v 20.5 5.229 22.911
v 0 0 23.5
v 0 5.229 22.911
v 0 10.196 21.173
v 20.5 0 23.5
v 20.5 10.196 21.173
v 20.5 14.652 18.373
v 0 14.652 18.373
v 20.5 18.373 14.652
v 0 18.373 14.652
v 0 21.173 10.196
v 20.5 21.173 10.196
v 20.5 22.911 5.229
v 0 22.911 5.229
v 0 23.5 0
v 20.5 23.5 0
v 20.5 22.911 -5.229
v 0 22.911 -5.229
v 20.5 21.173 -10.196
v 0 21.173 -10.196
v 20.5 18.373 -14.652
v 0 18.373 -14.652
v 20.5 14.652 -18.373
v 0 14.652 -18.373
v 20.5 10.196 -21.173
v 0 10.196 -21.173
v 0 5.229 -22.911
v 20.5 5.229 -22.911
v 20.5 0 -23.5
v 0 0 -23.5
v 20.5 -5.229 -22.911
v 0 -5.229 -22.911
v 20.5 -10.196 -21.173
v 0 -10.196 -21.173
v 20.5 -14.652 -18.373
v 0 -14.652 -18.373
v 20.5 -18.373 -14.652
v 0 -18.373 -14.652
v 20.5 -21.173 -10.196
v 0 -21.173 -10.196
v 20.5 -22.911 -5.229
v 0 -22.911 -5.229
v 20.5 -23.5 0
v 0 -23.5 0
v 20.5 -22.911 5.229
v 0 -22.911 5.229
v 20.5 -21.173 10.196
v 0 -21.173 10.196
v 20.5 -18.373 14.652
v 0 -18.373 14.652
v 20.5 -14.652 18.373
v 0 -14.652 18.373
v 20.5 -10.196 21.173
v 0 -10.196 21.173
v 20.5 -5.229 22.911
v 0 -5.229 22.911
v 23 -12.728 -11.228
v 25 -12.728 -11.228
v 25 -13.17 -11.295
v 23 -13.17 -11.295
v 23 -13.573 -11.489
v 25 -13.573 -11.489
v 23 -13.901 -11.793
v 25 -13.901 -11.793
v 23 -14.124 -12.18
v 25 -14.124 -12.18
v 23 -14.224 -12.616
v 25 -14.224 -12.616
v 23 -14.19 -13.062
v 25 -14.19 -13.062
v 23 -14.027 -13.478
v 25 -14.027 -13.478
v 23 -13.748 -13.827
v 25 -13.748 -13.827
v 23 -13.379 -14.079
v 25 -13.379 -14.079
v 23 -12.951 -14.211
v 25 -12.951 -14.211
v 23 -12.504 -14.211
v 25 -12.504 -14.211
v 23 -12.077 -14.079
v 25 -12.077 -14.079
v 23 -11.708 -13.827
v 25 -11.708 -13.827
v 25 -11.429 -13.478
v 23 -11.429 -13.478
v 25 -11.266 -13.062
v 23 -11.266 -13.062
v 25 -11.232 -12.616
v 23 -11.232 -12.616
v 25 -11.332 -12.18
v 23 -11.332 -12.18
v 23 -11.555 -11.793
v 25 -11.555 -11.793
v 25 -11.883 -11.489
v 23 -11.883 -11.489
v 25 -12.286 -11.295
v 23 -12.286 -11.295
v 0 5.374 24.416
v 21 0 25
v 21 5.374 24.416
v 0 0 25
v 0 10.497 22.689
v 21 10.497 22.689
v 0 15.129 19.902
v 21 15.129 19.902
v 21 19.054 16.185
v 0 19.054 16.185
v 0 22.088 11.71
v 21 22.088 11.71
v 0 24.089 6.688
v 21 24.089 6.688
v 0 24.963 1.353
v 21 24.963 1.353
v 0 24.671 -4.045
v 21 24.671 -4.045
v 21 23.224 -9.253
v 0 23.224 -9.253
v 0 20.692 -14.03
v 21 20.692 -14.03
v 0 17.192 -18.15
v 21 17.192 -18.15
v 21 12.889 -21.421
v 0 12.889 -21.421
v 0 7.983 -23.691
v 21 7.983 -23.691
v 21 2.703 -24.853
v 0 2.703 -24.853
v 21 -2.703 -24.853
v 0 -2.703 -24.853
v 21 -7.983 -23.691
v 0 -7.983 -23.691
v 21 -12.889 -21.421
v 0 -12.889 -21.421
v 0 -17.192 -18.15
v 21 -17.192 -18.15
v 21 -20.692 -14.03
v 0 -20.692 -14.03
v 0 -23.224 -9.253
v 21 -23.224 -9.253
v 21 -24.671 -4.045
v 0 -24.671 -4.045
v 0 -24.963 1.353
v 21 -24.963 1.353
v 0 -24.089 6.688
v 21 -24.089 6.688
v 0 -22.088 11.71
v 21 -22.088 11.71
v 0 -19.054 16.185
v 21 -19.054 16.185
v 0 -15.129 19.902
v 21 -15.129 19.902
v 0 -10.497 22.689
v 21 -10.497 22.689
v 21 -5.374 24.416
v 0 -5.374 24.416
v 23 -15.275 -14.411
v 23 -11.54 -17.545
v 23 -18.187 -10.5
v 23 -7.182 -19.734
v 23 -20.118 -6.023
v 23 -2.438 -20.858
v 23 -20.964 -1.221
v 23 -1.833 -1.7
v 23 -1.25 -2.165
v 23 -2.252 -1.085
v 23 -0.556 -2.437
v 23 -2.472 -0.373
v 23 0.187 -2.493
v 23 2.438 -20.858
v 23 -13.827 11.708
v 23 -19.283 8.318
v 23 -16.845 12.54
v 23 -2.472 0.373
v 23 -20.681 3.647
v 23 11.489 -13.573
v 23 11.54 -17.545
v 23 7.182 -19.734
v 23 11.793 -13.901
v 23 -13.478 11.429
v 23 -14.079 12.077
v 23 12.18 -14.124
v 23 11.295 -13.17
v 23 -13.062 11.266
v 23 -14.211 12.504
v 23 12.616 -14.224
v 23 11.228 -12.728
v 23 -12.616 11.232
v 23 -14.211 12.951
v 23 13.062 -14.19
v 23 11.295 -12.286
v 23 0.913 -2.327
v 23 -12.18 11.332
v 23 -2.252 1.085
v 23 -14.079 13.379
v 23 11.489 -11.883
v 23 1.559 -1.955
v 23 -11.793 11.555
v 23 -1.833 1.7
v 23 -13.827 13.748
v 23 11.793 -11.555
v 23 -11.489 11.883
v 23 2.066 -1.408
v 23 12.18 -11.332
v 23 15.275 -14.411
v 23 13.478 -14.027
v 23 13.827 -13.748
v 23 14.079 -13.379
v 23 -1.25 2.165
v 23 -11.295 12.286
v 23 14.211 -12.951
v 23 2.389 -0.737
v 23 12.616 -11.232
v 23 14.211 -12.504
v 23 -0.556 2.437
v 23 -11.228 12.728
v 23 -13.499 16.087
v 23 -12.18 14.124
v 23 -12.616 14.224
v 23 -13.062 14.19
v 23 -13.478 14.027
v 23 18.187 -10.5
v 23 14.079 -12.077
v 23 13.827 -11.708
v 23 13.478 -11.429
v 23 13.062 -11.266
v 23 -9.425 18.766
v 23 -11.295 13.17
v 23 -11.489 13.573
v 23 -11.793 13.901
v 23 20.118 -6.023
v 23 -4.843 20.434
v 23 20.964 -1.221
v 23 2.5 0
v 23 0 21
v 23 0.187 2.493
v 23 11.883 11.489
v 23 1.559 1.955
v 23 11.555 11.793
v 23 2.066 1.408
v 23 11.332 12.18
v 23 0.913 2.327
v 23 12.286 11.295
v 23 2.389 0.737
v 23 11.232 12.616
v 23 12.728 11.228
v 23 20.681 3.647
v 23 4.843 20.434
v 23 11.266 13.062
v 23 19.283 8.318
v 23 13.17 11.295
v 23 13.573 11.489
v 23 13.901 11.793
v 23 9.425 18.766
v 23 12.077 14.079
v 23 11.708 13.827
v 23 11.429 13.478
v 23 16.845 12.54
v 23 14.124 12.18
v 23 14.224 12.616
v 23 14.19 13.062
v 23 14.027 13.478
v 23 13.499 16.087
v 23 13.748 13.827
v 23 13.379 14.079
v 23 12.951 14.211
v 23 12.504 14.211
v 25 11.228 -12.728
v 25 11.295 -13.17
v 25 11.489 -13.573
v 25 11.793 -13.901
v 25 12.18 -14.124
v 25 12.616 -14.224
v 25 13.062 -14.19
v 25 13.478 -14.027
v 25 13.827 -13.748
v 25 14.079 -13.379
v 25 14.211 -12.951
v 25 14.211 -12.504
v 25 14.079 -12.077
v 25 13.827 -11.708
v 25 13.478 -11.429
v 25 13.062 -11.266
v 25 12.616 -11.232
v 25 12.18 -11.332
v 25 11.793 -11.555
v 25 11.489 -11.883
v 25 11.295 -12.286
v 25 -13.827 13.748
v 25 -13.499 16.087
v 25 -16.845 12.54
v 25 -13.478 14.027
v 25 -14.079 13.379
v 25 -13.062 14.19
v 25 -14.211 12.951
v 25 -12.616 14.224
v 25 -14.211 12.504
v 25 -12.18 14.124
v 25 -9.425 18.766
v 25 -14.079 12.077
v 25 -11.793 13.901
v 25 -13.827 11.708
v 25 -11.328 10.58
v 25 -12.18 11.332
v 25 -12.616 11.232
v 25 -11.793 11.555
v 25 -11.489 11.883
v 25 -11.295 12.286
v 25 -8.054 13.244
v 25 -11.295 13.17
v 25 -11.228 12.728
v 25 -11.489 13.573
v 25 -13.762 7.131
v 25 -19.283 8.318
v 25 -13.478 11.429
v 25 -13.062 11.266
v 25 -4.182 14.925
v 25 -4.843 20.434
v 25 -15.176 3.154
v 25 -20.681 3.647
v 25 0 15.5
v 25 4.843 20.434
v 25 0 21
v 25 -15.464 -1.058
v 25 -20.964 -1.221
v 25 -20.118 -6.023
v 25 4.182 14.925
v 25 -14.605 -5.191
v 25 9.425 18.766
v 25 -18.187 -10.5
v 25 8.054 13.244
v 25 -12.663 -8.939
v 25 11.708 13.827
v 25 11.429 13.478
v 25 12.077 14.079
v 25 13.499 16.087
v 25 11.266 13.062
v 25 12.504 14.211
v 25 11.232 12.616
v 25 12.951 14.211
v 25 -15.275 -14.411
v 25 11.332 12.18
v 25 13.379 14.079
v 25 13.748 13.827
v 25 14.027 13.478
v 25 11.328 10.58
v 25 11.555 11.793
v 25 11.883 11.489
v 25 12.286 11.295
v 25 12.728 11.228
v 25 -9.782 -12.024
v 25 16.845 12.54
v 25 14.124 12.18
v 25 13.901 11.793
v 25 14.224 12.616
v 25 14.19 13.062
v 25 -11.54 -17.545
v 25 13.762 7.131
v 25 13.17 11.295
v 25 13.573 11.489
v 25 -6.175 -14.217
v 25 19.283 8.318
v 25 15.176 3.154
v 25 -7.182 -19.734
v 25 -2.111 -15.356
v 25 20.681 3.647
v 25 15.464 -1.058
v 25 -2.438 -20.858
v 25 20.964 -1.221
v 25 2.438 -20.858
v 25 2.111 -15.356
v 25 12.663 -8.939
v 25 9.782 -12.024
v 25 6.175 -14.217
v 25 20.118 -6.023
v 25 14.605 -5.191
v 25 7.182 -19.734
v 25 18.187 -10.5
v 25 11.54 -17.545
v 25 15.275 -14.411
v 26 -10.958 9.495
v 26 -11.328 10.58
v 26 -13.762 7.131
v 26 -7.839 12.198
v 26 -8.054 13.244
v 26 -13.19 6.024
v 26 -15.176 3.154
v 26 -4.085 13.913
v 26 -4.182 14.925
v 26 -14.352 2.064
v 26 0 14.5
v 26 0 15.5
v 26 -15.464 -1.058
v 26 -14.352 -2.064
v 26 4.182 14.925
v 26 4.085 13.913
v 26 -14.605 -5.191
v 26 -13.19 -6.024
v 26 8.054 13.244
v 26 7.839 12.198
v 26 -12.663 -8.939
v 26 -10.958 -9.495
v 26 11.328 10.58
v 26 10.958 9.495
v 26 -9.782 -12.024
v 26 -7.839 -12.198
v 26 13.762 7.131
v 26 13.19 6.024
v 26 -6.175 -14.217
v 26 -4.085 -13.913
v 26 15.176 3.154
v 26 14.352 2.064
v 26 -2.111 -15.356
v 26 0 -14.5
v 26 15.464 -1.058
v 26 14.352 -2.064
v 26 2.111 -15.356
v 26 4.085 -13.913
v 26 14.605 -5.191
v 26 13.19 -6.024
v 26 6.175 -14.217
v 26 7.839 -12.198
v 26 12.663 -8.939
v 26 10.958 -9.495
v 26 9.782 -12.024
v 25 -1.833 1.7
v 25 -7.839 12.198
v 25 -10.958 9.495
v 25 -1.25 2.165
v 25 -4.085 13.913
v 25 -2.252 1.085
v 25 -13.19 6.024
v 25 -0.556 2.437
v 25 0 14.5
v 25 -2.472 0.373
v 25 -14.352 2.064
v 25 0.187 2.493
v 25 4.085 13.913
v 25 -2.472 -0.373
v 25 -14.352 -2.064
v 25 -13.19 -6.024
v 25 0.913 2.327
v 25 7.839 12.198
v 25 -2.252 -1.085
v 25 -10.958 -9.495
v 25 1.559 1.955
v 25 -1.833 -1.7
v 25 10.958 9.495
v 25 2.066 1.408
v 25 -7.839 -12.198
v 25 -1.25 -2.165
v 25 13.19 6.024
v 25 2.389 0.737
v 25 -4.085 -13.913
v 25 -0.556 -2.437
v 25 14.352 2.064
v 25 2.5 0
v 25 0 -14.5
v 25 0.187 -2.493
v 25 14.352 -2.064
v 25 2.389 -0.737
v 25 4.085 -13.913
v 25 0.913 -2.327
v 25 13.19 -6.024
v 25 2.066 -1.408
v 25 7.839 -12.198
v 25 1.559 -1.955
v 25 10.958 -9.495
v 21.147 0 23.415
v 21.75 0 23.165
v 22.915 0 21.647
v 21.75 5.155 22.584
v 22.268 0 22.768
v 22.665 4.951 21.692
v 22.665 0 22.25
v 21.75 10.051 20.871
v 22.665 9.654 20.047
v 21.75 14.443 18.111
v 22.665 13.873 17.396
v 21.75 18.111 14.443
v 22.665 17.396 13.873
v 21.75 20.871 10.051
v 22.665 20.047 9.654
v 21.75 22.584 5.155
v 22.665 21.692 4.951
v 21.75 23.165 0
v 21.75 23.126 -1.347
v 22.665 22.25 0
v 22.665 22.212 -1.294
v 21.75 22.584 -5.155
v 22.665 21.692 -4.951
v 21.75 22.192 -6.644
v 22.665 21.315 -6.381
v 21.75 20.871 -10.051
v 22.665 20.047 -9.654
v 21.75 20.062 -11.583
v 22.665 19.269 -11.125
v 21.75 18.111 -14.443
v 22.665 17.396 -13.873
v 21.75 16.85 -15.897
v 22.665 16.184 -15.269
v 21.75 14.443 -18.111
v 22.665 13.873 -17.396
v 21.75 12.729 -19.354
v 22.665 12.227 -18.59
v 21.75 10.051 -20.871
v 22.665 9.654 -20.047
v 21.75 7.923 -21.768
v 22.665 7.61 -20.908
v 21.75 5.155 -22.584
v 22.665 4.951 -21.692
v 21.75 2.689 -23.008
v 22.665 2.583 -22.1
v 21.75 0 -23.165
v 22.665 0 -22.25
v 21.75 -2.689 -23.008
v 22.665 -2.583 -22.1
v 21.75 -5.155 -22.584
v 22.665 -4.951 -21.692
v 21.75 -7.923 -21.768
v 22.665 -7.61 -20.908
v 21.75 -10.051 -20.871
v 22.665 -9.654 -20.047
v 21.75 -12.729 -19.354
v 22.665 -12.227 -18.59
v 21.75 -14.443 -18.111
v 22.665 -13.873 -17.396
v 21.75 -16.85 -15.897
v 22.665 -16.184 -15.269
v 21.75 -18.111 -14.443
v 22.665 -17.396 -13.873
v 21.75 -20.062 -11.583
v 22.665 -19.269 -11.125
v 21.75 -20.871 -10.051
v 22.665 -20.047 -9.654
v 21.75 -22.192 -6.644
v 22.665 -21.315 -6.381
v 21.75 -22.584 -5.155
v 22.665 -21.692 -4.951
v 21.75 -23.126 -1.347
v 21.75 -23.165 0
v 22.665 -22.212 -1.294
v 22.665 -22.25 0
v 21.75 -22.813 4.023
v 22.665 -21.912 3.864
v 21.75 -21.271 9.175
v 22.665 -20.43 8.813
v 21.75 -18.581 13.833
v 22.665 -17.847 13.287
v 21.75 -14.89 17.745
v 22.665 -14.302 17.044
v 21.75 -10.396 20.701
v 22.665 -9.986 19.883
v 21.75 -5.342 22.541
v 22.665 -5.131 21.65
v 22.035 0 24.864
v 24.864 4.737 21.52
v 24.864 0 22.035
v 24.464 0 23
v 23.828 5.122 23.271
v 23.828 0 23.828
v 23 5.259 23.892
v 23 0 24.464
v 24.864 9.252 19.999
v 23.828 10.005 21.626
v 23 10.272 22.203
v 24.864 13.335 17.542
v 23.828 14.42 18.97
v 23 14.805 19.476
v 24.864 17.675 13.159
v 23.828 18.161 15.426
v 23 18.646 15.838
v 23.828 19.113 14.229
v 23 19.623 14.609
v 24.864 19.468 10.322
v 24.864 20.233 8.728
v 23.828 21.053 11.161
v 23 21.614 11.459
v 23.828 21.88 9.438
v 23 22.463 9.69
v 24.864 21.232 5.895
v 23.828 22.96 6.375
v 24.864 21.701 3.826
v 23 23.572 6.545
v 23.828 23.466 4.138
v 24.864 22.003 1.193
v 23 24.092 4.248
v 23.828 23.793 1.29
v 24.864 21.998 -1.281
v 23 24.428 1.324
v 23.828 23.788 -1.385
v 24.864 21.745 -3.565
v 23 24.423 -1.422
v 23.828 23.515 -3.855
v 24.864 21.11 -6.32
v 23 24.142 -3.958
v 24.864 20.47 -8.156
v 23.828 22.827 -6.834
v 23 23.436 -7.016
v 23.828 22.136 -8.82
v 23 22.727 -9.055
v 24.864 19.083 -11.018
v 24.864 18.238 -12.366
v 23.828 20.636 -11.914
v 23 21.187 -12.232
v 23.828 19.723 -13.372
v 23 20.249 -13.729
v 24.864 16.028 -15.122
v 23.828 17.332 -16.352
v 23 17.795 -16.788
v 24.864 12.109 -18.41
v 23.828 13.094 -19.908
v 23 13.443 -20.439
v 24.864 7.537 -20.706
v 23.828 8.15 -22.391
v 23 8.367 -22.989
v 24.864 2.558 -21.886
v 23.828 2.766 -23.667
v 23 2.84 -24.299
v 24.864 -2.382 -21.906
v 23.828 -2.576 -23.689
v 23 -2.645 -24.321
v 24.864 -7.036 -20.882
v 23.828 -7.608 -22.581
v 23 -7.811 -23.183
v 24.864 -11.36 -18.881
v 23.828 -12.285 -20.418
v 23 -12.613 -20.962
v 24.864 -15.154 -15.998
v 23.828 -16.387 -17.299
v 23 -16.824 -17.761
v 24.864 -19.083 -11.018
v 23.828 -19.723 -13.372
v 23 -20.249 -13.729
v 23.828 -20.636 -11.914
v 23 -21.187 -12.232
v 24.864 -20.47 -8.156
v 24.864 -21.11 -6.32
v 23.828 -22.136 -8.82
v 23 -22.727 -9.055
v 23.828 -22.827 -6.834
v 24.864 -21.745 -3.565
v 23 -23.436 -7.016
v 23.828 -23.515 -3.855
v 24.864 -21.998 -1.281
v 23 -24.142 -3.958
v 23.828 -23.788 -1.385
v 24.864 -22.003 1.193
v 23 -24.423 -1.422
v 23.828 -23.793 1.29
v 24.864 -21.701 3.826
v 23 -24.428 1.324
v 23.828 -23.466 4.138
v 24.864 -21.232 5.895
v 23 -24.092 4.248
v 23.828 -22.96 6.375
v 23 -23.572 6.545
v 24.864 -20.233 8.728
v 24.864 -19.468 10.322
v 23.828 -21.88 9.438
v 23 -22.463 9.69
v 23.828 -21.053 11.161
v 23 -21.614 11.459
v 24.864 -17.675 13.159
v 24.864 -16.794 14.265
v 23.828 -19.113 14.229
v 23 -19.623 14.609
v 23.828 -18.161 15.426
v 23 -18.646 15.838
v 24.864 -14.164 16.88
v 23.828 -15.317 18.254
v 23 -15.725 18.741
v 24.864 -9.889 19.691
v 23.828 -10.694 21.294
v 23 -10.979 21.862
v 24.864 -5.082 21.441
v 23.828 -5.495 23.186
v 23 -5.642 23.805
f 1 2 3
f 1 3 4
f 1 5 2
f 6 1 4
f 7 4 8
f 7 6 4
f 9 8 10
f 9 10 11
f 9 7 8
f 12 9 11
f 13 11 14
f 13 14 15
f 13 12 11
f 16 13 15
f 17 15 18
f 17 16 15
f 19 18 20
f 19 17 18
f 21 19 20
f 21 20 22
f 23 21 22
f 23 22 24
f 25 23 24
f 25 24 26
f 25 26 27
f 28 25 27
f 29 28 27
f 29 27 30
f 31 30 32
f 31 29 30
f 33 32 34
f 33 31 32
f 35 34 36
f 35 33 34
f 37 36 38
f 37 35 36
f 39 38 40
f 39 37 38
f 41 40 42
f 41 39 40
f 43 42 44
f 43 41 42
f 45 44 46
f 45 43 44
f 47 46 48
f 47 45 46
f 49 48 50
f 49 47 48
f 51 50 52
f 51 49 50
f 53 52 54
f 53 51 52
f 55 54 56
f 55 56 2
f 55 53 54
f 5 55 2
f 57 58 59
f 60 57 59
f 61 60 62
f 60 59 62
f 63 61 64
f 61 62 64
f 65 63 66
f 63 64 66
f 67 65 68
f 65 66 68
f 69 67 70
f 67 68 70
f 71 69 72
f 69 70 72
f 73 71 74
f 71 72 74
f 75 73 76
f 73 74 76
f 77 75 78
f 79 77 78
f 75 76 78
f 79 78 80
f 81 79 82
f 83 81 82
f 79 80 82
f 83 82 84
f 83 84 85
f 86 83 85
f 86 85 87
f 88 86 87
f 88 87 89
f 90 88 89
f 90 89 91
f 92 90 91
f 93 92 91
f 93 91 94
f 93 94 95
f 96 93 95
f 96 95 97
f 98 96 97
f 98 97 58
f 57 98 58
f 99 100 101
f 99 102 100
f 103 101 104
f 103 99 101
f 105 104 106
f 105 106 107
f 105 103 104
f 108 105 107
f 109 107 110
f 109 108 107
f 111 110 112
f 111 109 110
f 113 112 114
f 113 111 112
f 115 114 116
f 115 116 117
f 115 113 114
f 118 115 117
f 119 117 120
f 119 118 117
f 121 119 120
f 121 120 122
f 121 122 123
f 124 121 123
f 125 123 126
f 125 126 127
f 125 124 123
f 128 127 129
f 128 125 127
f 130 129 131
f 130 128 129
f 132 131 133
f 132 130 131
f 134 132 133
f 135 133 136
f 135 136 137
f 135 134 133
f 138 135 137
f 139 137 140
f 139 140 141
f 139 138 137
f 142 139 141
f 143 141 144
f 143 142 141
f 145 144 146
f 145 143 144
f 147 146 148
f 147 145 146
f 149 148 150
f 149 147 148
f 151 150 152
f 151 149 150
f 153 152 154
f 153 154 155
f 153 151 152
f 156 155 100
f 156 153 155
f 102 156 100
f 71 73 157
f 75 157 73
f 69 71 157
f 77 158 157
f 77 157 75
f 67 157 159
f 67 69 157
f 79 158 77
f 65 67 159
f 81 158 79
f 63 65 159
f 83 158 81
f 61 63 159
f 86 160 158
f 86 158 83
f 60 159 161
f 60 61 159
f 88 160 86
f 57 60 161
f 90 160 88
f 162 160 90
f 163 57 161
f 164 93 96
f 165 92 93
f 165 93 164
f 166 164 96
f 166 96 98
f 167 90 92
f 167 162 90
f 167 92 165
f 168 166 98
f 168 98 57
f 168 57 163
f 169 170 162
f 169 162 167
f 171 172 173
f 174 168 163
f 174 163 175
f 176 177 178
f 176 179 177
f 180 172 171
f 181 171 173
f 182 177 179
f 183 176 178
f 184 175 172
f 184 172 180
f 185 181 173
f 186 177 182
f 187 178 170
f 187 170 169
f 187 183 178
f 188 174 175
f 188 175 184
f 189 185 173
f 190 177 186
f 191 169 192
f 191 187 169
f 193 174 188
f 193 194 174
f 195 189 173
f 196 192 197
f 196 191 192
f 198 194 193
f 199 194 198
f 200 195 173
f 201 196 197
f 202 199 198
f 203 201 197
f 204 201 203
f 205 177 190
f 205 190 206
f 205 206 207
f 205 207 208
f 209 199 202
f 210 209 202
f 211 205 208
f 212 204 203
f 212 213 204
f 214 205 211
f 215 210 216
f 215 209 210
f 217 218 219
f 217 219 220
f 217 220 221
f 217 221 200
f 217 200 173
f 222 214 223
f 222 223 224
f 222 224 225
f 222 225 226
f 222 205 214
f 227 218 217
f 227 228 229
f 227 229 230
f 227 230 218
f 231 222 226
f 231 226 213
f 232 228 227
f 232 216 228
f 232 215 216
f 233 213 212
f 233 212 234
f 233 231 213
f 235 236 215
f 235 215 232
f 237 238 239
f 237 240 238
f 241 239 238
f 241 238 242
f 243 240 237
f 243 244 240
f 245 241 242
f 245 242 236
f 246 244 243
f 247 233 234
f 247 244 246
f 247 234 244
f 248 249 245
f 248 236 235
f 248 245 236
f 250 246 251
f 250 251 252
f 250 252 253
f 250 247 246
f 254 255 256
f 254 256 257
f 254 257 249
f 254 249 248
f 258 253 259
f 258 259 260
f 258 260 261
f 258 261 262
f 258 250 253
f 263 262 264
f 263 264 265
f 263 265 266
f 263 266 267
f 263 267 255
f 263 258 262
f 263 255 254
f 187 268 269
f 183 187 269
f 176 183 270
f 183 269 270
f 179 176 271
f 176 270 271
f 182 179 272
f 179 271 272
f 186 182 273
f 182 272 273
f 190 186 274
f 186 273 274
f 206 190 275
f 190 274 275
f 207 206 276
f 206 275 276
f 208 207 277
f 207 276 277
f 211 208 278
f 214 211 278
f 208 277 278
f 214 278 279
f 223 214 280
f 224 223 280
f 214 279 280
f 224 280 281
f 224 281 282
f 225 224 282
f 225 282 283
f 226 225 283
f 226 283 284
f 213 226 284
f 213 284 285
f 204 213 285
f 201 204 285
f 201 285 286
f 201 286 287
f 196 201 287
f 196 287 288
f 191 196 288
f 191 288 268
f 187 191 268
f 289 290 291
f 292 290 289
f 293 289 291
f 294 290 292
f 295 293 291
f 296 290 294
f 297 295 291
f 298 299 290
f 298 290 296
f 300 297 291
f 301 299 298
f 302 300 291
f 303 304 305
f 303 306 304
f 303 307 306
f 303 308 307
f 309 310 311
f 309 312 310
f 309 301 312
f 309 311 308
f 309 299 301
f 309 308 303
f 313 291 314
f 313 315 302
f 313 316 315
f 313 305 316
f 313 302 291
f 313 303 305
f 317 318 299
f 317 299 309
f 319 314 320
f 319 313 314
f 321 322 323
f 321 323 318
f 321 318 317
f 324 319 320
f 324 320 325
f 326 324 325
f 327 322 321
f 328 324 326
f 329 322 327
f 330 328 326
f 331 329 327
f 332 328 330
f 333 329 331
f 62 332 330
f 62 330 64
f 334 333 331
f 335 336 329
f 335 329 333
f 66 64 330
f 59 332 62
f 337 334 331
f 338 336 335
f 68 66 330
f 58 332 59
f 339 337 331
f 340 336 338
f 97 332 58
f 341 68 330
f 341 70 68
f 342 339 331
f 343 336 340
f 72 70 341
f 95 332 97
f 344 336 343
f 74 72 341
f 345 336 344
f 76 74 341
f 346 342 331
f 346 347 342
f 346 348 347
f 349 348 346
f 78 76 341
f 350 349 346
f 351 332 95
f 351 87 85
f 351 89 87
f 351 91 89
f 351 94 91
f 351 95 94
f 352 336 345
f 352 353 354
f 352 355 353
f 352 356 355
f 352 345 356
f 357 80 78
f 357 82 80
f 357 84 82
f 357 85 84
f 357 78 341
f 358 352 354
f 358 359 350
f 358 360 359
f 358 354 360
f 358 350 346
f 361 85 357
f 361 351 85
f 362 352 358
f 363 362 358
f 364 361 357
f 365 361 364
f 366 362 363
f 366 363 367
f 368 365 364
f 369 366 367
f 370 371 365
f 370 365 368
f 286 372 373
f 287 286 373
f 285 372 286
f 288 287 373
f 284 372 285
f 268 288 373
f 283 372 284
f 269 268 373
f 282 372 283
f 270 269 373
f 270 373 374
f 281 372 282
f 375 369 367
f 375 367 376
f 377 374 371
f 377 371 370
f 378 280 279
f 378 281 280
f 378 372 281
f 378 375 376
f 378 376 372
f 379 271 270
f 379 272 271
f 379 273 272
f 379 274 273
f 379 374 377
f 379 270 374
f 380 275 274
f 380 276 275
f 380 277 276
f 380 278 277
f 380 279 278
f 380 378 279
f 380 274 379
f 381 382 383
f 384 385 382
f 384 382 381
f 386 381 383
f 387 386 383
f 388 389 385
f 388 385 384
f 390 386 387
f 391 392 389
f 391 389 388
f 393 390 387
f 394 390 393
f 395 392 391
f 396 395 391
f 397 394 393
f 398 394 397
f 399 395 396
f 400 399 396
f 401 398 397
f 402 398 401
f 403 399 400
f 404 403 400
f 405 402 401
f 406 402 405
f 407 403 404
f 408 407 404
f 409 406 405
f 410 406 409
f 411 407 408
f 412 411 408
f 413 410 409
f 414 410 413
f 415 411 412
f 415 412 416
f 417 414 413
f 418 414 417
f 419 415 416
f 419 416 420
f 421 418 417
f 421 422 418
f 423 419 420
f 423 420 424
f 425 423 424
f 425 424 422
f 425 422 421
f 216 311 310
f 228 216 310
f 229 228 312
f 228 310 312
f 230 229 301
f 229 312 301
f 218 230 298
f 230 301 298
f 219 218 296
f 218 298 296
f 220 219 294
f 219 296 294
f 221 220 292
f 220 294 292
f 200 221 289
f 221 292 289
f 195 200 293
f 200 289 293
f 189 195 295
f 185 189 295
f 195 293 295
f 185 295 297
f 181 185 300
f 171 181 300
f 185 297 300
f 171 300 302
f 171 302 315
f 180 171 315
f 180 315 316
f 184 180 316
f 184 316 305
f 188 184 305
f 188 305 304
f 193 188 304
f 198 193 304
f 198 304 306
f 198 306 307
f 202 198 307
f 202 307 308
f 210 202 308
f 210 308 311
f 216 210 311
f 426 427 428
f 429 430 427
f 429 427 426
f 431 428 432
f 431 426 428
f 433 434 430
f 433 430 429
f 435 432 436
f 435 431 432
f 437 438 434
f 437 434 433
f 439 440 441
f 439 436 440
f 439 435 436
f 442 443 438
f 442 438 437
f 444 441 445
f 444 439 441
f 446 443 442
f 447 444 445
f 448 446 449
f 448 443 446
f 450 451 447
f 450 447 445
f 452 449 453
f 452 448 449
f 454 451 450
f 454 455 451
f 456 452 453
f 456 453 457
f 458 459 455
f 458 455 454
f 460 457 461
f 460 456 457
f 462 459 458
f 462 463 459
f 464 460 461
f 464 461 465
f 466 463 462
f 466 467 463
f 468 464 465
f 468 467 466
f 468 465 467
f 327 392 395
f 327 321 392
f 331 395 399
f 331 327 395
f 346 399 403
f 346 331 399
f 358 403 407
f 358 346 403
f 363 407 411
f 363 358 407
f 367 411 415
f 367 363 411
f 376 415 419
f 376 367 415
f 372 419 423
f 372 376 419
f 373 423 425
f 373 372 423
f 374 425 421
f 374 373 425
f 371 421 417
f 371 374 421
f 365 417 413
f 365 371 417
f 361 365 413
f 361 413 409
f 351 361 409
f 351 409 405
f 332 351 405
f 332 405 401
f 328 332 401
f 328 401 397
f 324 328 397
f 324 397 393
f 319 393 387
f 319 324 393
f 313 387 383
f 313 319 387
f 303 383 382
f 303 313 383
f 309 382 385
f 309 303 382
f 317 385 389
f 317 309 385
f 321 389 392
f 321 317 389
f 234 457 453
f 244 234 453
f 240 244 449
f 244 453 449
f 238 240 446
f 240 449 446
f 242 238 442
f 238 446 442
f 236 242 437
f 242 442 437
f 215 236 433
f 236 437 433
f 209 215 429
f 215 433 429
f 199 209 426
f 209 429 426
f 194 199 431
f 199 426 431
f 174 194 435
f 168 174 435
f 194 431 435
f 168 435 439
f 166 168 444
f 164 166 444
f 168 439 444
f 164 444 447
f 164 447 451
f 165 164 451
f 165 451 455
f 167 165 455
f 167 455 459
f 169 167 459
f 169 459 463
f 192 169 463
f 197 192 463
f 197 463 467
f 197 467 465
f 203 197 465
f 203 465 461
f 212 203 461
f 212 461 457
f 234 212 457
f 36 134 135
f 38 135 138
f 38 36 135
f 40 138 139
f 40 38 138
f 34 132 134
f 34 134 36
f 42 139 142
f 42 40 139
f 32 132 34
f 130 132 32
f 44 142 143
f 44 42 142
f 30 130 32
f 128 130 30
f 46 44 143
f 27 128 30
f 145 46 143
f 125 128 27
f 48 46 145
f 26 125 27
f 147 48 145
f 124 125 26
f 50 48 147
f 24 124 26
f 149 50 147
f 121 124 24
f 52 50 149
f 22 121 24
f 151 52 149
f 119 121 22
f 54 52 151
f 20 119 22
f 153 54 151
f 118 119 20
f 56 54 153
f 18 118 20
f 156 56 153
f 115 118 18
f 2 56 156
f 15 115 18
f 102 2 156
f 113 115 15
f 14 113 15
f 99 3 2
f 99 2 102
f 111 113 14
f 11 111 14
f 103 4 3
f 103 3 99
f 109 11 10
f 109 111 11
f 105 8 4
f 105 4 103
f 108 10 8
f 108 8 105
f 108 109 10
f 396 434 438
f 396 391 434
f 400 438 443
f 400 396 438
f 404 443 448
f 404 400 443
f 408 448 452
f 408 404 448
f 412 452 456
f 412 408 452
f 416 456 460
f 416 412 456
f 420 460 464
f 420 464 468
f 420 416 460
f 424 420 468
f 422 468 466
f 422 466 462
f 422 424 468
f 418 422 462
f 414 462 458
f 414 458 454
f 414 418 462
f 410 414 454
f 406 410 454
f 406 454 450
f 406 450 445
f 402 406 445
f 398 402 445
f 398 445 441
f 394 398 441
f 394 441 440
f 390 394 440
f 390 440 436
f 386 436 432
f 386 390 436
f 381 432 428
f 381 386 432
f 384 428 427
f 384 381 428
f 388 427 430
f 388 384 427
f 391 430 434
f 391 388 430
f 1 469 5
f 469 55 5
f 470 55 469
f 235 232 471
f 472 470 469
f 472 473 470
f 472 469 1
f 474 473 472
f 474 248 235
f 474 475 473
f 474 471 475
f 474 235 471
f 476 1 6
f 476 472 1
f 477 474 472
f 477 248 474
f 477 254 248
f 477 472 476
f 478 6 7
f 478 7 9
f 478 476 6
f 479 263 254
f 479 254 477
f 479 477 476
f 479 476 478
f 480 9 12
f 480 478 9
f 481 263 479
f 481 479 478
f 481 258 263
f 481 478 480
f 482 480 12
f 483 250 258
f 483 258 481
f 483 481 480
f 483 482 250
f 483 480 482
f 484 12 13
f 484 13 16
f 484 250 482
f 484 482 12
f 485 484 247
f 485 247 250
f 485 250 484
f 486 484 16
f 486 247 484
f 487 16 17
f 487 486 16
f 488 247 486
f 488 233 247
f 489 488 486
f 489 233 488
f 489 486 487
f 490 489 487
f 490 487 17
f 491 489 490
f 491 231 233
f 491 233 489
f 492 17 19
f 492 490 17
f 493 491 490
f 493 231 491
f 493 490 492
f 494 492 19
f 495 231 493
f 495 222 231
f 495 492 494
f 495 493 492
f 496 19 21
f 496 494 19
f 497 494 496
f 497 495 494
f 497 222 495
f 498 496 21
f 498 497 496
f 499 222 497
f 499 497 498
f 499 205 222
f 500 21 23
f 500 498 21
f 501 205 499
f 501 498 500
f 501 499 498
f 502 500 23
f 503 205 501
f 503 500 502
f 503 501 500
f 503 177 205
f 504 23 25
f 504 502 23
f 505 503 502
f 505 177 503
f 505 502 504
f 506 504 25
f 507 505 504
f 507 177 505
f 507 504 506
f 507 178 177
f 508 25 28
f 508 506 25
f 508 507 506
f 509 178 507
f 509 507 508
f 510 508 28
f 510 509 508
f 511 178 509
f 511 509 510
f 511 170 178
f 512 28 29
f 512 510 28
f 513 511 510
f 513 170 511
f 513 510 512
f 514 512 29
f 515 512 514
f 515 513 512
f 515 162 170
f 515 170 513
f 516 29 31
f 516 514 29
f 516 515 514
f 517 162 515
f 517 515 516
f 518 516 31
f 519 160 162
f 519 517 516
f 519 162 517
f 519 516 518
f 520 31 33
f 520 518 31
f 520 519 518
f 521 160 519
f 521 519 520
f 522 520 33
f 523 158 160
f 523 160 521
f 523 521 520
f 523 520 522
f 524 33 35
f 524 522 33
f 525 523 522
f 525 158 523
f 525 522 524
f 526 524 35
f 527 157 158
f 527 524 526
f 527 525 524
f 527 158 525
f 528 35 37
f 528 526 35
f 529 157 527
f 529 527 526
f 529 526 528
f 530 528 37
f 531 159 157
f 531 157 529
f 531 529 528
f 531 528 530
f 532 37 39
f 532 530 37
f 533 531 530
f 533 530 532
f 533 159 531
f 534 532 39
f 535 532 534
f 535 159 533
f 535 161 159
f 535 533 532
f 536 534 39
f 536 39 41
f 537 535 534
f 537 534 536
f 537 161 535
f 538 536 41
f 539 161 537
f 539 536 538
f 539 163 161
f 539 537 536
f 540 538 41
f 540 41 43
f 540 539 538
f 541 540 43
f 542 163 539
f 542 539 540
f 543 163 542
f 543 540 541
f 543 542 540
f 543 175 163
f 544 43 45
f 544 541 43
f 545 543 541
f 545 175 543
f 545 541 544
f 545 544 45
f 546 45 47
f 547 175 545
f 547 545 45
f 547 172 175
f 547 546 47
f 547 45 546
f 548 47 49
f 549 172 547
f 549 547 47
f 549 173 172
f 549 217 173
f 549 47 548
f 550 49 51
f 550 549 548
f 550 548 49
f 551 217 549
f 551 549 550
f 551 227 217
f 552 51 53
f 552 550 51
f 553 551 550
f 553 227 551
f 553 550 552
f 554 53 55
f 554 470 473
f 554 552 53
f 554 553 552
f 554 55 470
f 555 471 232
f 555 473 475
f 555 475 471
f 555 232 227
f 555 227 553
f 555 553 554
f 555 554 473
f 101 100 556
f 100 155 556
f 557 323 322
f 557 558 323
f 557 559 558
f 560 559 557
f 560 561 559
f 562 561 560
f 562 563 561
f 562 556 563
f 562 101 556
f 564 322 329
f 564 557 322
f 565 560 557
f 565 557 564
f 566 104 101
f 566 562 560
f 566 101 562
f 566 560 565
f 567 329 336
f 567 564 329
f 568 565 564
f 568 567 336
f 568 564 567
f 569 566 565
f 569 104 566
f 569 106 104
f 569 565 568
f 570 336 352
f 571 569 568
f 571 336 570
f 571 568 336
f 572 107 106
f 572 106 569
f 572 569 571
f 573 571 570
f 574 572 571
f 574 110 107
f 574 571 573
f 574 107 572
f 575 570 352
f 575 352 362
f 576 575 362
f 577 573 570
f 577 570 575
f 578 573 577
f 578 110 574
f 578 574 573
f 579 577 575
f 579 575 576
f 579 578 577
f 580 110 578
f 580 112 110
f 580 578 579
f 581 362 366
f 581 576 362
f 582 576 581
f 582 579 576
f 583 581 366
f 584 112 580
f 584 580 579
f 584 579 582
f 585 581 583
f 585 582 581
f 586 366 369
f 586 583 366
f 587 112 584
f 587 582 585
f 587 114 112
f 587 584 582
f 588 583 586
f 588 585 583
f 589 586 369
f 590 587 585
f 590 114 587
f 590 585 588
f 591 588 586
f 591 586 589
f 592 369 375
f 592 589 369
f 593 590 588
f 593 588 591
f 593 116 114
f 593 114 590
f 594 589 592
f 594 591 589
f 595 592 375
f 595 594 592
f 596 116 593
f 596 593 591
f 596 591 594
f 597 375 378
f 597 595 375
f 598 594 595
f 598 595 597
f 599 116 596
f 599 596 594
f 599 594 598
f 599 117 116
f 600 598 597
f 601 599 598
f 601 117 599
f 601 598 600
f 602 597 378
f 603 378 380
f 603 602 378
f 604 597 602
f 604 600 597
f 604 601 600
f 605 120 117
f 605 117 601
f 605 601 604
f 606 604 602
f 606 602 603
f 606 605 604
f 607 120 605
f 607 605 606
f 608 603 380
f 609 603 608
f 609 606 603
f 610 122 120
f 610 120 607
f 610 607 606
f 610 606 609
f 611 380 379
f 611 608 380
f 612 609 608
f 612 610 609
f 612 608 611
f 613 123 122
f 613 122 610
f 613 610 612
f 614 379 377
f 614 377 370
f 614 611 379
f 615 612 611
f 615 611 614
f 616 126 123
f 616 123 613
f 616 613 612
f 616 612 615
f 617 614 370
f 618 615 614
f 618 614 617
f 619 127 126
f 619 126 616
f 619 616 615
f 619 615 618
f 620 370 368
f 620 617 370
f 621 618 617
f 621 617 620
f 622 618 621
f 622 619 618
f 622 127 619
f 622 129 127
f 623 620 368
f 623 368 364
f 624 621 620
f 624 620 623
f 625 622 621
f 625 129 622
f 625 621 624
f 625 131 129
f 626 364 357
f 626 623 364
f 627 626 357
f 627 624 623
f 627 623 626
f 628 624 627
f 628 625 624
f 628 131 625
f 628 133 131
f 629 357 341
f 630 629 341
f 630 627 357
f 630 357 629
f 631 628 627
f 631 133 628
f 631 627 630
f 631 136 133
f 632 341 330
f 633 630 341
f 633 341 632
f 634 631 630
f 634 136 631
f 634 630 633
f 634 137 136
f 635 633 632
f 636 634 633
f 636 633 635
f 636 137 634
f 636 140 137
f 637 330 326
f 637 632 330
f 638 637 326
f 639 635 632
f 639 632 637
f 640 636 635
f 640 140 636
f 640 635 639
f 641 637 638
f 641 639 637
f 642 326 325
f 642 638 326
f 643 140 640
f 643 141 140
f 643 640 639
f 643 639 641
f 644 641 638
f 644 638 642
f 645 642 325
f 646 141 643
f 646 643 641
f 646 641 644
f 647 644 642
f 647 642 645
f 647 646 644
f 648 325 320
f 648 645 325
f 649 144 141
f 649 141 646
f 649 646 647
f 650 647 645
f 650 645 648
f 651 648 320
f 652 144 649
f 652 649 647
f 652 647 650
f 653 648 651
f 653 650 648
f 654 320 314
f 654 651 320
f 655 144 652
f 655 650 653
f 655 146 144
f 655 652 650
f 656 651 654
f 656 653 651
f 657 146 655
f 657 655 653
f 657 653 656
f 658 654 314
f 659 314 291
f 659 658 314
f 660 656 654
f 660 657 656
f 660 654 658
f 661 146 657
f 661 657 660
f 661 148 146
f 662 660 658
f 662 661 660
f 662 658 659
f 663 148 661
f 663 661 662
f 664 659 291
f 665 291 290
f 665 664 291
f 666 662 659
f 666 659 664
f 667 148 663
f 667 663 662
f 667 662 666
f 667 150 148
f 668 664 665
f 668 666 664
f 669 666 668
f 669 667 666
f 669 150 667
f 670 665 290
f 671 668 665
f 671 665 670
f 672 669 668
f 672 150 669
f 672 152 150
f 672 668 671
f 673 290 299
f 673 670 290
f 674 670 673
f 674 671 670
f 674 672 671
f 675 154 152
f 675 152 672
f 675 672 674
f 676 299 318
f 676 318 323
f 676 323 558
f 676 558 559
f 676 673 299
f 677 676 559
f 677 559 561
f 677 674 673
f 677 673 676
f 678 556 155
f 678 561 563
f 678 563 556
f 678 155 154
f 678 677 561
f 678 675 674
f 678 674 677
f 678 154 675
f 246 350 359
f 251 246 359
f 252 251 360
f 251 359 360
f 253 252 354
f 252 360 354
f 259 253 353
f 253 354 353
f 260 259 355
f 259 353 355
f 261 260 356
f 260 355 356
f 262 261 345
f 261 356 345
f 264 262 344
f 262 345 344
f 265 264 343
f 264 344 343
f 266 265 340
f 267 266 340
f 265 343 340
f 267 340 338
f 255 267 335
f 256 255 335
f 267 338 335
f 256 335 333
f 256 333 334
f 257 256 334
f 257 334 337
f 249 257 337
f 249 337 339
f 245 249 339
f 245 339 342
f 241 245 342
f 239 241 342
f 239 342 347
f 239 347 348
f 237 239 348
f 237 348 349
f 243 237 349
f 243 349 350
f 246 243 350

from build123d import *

# Parameters (mm, degrees)
F2_R            = 2.5
F3_DEPTH        = 25.001
F2_R_2          = 1.5
F4_DEPTH        = 25.001
F4_COPIES_COUNT = 4


# Not quite as in the source:
# - a pattern or mirror of a feature is missing from the dataset's text; its kind, count and spacing are read off the source's solid


with BuildPart() as f1:
    # F0 (on Front) → F1 (revolve)
    with BuildSketch(Plane.XZ):
        with BuildLine():
            Line((0, 25), (0, 23.5))
            Line((0, 23.5), (20.5, 23.5))
            ThreePointArc((20.5, 23.5), (22.267766953, 22.767766953), (23, 21))
            Line((23, 21), (23, 0))
            Line((23, 0), (25, 0))
            Line((25, 0), (25, 14.5))
            Line((25, 14.5), (26, 14.5))
            Line((26, 14.5), (26, 15.5))
            Line((26, 15.5), (25, 15.5))
            Line((25, 15.5), (25, 21))
            ThreePointArc((25, 21), (23.8284271247, 23.8284271247), (21, 25))
            Line((21, 25), (0, 25))
        make_face()
    revolve(axis=Axis((24, 0, 0), (-1, 0, 0)))

    # F2 (on face) → F3 (cut, through all)
    with BuildSketch(Plane.YZ.offset(25)):
        Circle(F2_R)
    extrude(amount=-F3_DEPTH, mode=Mode.SUBTRACT)

    # F2 (on face) → F4 (cut, through all)
    with BuildSketch(Plane.YZ.offset(25)):
        with Locations((-12.7279220614, 12.7279220614)):
            Circle(F2_R_2)
    f4 = extrude(amount=-F4_DEPTH, mode=Mode.SUBTRACT)

    # F4_copies: F4 ×4 about axis
    f4_copies_axis = Axis((0, 0, 0), (1, 0, 0))
    for i in range(1, F4_COPIES_COUNT):
        add(f4.rotate(f4_copies_axis, i * 360 / F4_COPIES_COUNT), mode=Mode.SUBTRACT)


solid = f1.part
